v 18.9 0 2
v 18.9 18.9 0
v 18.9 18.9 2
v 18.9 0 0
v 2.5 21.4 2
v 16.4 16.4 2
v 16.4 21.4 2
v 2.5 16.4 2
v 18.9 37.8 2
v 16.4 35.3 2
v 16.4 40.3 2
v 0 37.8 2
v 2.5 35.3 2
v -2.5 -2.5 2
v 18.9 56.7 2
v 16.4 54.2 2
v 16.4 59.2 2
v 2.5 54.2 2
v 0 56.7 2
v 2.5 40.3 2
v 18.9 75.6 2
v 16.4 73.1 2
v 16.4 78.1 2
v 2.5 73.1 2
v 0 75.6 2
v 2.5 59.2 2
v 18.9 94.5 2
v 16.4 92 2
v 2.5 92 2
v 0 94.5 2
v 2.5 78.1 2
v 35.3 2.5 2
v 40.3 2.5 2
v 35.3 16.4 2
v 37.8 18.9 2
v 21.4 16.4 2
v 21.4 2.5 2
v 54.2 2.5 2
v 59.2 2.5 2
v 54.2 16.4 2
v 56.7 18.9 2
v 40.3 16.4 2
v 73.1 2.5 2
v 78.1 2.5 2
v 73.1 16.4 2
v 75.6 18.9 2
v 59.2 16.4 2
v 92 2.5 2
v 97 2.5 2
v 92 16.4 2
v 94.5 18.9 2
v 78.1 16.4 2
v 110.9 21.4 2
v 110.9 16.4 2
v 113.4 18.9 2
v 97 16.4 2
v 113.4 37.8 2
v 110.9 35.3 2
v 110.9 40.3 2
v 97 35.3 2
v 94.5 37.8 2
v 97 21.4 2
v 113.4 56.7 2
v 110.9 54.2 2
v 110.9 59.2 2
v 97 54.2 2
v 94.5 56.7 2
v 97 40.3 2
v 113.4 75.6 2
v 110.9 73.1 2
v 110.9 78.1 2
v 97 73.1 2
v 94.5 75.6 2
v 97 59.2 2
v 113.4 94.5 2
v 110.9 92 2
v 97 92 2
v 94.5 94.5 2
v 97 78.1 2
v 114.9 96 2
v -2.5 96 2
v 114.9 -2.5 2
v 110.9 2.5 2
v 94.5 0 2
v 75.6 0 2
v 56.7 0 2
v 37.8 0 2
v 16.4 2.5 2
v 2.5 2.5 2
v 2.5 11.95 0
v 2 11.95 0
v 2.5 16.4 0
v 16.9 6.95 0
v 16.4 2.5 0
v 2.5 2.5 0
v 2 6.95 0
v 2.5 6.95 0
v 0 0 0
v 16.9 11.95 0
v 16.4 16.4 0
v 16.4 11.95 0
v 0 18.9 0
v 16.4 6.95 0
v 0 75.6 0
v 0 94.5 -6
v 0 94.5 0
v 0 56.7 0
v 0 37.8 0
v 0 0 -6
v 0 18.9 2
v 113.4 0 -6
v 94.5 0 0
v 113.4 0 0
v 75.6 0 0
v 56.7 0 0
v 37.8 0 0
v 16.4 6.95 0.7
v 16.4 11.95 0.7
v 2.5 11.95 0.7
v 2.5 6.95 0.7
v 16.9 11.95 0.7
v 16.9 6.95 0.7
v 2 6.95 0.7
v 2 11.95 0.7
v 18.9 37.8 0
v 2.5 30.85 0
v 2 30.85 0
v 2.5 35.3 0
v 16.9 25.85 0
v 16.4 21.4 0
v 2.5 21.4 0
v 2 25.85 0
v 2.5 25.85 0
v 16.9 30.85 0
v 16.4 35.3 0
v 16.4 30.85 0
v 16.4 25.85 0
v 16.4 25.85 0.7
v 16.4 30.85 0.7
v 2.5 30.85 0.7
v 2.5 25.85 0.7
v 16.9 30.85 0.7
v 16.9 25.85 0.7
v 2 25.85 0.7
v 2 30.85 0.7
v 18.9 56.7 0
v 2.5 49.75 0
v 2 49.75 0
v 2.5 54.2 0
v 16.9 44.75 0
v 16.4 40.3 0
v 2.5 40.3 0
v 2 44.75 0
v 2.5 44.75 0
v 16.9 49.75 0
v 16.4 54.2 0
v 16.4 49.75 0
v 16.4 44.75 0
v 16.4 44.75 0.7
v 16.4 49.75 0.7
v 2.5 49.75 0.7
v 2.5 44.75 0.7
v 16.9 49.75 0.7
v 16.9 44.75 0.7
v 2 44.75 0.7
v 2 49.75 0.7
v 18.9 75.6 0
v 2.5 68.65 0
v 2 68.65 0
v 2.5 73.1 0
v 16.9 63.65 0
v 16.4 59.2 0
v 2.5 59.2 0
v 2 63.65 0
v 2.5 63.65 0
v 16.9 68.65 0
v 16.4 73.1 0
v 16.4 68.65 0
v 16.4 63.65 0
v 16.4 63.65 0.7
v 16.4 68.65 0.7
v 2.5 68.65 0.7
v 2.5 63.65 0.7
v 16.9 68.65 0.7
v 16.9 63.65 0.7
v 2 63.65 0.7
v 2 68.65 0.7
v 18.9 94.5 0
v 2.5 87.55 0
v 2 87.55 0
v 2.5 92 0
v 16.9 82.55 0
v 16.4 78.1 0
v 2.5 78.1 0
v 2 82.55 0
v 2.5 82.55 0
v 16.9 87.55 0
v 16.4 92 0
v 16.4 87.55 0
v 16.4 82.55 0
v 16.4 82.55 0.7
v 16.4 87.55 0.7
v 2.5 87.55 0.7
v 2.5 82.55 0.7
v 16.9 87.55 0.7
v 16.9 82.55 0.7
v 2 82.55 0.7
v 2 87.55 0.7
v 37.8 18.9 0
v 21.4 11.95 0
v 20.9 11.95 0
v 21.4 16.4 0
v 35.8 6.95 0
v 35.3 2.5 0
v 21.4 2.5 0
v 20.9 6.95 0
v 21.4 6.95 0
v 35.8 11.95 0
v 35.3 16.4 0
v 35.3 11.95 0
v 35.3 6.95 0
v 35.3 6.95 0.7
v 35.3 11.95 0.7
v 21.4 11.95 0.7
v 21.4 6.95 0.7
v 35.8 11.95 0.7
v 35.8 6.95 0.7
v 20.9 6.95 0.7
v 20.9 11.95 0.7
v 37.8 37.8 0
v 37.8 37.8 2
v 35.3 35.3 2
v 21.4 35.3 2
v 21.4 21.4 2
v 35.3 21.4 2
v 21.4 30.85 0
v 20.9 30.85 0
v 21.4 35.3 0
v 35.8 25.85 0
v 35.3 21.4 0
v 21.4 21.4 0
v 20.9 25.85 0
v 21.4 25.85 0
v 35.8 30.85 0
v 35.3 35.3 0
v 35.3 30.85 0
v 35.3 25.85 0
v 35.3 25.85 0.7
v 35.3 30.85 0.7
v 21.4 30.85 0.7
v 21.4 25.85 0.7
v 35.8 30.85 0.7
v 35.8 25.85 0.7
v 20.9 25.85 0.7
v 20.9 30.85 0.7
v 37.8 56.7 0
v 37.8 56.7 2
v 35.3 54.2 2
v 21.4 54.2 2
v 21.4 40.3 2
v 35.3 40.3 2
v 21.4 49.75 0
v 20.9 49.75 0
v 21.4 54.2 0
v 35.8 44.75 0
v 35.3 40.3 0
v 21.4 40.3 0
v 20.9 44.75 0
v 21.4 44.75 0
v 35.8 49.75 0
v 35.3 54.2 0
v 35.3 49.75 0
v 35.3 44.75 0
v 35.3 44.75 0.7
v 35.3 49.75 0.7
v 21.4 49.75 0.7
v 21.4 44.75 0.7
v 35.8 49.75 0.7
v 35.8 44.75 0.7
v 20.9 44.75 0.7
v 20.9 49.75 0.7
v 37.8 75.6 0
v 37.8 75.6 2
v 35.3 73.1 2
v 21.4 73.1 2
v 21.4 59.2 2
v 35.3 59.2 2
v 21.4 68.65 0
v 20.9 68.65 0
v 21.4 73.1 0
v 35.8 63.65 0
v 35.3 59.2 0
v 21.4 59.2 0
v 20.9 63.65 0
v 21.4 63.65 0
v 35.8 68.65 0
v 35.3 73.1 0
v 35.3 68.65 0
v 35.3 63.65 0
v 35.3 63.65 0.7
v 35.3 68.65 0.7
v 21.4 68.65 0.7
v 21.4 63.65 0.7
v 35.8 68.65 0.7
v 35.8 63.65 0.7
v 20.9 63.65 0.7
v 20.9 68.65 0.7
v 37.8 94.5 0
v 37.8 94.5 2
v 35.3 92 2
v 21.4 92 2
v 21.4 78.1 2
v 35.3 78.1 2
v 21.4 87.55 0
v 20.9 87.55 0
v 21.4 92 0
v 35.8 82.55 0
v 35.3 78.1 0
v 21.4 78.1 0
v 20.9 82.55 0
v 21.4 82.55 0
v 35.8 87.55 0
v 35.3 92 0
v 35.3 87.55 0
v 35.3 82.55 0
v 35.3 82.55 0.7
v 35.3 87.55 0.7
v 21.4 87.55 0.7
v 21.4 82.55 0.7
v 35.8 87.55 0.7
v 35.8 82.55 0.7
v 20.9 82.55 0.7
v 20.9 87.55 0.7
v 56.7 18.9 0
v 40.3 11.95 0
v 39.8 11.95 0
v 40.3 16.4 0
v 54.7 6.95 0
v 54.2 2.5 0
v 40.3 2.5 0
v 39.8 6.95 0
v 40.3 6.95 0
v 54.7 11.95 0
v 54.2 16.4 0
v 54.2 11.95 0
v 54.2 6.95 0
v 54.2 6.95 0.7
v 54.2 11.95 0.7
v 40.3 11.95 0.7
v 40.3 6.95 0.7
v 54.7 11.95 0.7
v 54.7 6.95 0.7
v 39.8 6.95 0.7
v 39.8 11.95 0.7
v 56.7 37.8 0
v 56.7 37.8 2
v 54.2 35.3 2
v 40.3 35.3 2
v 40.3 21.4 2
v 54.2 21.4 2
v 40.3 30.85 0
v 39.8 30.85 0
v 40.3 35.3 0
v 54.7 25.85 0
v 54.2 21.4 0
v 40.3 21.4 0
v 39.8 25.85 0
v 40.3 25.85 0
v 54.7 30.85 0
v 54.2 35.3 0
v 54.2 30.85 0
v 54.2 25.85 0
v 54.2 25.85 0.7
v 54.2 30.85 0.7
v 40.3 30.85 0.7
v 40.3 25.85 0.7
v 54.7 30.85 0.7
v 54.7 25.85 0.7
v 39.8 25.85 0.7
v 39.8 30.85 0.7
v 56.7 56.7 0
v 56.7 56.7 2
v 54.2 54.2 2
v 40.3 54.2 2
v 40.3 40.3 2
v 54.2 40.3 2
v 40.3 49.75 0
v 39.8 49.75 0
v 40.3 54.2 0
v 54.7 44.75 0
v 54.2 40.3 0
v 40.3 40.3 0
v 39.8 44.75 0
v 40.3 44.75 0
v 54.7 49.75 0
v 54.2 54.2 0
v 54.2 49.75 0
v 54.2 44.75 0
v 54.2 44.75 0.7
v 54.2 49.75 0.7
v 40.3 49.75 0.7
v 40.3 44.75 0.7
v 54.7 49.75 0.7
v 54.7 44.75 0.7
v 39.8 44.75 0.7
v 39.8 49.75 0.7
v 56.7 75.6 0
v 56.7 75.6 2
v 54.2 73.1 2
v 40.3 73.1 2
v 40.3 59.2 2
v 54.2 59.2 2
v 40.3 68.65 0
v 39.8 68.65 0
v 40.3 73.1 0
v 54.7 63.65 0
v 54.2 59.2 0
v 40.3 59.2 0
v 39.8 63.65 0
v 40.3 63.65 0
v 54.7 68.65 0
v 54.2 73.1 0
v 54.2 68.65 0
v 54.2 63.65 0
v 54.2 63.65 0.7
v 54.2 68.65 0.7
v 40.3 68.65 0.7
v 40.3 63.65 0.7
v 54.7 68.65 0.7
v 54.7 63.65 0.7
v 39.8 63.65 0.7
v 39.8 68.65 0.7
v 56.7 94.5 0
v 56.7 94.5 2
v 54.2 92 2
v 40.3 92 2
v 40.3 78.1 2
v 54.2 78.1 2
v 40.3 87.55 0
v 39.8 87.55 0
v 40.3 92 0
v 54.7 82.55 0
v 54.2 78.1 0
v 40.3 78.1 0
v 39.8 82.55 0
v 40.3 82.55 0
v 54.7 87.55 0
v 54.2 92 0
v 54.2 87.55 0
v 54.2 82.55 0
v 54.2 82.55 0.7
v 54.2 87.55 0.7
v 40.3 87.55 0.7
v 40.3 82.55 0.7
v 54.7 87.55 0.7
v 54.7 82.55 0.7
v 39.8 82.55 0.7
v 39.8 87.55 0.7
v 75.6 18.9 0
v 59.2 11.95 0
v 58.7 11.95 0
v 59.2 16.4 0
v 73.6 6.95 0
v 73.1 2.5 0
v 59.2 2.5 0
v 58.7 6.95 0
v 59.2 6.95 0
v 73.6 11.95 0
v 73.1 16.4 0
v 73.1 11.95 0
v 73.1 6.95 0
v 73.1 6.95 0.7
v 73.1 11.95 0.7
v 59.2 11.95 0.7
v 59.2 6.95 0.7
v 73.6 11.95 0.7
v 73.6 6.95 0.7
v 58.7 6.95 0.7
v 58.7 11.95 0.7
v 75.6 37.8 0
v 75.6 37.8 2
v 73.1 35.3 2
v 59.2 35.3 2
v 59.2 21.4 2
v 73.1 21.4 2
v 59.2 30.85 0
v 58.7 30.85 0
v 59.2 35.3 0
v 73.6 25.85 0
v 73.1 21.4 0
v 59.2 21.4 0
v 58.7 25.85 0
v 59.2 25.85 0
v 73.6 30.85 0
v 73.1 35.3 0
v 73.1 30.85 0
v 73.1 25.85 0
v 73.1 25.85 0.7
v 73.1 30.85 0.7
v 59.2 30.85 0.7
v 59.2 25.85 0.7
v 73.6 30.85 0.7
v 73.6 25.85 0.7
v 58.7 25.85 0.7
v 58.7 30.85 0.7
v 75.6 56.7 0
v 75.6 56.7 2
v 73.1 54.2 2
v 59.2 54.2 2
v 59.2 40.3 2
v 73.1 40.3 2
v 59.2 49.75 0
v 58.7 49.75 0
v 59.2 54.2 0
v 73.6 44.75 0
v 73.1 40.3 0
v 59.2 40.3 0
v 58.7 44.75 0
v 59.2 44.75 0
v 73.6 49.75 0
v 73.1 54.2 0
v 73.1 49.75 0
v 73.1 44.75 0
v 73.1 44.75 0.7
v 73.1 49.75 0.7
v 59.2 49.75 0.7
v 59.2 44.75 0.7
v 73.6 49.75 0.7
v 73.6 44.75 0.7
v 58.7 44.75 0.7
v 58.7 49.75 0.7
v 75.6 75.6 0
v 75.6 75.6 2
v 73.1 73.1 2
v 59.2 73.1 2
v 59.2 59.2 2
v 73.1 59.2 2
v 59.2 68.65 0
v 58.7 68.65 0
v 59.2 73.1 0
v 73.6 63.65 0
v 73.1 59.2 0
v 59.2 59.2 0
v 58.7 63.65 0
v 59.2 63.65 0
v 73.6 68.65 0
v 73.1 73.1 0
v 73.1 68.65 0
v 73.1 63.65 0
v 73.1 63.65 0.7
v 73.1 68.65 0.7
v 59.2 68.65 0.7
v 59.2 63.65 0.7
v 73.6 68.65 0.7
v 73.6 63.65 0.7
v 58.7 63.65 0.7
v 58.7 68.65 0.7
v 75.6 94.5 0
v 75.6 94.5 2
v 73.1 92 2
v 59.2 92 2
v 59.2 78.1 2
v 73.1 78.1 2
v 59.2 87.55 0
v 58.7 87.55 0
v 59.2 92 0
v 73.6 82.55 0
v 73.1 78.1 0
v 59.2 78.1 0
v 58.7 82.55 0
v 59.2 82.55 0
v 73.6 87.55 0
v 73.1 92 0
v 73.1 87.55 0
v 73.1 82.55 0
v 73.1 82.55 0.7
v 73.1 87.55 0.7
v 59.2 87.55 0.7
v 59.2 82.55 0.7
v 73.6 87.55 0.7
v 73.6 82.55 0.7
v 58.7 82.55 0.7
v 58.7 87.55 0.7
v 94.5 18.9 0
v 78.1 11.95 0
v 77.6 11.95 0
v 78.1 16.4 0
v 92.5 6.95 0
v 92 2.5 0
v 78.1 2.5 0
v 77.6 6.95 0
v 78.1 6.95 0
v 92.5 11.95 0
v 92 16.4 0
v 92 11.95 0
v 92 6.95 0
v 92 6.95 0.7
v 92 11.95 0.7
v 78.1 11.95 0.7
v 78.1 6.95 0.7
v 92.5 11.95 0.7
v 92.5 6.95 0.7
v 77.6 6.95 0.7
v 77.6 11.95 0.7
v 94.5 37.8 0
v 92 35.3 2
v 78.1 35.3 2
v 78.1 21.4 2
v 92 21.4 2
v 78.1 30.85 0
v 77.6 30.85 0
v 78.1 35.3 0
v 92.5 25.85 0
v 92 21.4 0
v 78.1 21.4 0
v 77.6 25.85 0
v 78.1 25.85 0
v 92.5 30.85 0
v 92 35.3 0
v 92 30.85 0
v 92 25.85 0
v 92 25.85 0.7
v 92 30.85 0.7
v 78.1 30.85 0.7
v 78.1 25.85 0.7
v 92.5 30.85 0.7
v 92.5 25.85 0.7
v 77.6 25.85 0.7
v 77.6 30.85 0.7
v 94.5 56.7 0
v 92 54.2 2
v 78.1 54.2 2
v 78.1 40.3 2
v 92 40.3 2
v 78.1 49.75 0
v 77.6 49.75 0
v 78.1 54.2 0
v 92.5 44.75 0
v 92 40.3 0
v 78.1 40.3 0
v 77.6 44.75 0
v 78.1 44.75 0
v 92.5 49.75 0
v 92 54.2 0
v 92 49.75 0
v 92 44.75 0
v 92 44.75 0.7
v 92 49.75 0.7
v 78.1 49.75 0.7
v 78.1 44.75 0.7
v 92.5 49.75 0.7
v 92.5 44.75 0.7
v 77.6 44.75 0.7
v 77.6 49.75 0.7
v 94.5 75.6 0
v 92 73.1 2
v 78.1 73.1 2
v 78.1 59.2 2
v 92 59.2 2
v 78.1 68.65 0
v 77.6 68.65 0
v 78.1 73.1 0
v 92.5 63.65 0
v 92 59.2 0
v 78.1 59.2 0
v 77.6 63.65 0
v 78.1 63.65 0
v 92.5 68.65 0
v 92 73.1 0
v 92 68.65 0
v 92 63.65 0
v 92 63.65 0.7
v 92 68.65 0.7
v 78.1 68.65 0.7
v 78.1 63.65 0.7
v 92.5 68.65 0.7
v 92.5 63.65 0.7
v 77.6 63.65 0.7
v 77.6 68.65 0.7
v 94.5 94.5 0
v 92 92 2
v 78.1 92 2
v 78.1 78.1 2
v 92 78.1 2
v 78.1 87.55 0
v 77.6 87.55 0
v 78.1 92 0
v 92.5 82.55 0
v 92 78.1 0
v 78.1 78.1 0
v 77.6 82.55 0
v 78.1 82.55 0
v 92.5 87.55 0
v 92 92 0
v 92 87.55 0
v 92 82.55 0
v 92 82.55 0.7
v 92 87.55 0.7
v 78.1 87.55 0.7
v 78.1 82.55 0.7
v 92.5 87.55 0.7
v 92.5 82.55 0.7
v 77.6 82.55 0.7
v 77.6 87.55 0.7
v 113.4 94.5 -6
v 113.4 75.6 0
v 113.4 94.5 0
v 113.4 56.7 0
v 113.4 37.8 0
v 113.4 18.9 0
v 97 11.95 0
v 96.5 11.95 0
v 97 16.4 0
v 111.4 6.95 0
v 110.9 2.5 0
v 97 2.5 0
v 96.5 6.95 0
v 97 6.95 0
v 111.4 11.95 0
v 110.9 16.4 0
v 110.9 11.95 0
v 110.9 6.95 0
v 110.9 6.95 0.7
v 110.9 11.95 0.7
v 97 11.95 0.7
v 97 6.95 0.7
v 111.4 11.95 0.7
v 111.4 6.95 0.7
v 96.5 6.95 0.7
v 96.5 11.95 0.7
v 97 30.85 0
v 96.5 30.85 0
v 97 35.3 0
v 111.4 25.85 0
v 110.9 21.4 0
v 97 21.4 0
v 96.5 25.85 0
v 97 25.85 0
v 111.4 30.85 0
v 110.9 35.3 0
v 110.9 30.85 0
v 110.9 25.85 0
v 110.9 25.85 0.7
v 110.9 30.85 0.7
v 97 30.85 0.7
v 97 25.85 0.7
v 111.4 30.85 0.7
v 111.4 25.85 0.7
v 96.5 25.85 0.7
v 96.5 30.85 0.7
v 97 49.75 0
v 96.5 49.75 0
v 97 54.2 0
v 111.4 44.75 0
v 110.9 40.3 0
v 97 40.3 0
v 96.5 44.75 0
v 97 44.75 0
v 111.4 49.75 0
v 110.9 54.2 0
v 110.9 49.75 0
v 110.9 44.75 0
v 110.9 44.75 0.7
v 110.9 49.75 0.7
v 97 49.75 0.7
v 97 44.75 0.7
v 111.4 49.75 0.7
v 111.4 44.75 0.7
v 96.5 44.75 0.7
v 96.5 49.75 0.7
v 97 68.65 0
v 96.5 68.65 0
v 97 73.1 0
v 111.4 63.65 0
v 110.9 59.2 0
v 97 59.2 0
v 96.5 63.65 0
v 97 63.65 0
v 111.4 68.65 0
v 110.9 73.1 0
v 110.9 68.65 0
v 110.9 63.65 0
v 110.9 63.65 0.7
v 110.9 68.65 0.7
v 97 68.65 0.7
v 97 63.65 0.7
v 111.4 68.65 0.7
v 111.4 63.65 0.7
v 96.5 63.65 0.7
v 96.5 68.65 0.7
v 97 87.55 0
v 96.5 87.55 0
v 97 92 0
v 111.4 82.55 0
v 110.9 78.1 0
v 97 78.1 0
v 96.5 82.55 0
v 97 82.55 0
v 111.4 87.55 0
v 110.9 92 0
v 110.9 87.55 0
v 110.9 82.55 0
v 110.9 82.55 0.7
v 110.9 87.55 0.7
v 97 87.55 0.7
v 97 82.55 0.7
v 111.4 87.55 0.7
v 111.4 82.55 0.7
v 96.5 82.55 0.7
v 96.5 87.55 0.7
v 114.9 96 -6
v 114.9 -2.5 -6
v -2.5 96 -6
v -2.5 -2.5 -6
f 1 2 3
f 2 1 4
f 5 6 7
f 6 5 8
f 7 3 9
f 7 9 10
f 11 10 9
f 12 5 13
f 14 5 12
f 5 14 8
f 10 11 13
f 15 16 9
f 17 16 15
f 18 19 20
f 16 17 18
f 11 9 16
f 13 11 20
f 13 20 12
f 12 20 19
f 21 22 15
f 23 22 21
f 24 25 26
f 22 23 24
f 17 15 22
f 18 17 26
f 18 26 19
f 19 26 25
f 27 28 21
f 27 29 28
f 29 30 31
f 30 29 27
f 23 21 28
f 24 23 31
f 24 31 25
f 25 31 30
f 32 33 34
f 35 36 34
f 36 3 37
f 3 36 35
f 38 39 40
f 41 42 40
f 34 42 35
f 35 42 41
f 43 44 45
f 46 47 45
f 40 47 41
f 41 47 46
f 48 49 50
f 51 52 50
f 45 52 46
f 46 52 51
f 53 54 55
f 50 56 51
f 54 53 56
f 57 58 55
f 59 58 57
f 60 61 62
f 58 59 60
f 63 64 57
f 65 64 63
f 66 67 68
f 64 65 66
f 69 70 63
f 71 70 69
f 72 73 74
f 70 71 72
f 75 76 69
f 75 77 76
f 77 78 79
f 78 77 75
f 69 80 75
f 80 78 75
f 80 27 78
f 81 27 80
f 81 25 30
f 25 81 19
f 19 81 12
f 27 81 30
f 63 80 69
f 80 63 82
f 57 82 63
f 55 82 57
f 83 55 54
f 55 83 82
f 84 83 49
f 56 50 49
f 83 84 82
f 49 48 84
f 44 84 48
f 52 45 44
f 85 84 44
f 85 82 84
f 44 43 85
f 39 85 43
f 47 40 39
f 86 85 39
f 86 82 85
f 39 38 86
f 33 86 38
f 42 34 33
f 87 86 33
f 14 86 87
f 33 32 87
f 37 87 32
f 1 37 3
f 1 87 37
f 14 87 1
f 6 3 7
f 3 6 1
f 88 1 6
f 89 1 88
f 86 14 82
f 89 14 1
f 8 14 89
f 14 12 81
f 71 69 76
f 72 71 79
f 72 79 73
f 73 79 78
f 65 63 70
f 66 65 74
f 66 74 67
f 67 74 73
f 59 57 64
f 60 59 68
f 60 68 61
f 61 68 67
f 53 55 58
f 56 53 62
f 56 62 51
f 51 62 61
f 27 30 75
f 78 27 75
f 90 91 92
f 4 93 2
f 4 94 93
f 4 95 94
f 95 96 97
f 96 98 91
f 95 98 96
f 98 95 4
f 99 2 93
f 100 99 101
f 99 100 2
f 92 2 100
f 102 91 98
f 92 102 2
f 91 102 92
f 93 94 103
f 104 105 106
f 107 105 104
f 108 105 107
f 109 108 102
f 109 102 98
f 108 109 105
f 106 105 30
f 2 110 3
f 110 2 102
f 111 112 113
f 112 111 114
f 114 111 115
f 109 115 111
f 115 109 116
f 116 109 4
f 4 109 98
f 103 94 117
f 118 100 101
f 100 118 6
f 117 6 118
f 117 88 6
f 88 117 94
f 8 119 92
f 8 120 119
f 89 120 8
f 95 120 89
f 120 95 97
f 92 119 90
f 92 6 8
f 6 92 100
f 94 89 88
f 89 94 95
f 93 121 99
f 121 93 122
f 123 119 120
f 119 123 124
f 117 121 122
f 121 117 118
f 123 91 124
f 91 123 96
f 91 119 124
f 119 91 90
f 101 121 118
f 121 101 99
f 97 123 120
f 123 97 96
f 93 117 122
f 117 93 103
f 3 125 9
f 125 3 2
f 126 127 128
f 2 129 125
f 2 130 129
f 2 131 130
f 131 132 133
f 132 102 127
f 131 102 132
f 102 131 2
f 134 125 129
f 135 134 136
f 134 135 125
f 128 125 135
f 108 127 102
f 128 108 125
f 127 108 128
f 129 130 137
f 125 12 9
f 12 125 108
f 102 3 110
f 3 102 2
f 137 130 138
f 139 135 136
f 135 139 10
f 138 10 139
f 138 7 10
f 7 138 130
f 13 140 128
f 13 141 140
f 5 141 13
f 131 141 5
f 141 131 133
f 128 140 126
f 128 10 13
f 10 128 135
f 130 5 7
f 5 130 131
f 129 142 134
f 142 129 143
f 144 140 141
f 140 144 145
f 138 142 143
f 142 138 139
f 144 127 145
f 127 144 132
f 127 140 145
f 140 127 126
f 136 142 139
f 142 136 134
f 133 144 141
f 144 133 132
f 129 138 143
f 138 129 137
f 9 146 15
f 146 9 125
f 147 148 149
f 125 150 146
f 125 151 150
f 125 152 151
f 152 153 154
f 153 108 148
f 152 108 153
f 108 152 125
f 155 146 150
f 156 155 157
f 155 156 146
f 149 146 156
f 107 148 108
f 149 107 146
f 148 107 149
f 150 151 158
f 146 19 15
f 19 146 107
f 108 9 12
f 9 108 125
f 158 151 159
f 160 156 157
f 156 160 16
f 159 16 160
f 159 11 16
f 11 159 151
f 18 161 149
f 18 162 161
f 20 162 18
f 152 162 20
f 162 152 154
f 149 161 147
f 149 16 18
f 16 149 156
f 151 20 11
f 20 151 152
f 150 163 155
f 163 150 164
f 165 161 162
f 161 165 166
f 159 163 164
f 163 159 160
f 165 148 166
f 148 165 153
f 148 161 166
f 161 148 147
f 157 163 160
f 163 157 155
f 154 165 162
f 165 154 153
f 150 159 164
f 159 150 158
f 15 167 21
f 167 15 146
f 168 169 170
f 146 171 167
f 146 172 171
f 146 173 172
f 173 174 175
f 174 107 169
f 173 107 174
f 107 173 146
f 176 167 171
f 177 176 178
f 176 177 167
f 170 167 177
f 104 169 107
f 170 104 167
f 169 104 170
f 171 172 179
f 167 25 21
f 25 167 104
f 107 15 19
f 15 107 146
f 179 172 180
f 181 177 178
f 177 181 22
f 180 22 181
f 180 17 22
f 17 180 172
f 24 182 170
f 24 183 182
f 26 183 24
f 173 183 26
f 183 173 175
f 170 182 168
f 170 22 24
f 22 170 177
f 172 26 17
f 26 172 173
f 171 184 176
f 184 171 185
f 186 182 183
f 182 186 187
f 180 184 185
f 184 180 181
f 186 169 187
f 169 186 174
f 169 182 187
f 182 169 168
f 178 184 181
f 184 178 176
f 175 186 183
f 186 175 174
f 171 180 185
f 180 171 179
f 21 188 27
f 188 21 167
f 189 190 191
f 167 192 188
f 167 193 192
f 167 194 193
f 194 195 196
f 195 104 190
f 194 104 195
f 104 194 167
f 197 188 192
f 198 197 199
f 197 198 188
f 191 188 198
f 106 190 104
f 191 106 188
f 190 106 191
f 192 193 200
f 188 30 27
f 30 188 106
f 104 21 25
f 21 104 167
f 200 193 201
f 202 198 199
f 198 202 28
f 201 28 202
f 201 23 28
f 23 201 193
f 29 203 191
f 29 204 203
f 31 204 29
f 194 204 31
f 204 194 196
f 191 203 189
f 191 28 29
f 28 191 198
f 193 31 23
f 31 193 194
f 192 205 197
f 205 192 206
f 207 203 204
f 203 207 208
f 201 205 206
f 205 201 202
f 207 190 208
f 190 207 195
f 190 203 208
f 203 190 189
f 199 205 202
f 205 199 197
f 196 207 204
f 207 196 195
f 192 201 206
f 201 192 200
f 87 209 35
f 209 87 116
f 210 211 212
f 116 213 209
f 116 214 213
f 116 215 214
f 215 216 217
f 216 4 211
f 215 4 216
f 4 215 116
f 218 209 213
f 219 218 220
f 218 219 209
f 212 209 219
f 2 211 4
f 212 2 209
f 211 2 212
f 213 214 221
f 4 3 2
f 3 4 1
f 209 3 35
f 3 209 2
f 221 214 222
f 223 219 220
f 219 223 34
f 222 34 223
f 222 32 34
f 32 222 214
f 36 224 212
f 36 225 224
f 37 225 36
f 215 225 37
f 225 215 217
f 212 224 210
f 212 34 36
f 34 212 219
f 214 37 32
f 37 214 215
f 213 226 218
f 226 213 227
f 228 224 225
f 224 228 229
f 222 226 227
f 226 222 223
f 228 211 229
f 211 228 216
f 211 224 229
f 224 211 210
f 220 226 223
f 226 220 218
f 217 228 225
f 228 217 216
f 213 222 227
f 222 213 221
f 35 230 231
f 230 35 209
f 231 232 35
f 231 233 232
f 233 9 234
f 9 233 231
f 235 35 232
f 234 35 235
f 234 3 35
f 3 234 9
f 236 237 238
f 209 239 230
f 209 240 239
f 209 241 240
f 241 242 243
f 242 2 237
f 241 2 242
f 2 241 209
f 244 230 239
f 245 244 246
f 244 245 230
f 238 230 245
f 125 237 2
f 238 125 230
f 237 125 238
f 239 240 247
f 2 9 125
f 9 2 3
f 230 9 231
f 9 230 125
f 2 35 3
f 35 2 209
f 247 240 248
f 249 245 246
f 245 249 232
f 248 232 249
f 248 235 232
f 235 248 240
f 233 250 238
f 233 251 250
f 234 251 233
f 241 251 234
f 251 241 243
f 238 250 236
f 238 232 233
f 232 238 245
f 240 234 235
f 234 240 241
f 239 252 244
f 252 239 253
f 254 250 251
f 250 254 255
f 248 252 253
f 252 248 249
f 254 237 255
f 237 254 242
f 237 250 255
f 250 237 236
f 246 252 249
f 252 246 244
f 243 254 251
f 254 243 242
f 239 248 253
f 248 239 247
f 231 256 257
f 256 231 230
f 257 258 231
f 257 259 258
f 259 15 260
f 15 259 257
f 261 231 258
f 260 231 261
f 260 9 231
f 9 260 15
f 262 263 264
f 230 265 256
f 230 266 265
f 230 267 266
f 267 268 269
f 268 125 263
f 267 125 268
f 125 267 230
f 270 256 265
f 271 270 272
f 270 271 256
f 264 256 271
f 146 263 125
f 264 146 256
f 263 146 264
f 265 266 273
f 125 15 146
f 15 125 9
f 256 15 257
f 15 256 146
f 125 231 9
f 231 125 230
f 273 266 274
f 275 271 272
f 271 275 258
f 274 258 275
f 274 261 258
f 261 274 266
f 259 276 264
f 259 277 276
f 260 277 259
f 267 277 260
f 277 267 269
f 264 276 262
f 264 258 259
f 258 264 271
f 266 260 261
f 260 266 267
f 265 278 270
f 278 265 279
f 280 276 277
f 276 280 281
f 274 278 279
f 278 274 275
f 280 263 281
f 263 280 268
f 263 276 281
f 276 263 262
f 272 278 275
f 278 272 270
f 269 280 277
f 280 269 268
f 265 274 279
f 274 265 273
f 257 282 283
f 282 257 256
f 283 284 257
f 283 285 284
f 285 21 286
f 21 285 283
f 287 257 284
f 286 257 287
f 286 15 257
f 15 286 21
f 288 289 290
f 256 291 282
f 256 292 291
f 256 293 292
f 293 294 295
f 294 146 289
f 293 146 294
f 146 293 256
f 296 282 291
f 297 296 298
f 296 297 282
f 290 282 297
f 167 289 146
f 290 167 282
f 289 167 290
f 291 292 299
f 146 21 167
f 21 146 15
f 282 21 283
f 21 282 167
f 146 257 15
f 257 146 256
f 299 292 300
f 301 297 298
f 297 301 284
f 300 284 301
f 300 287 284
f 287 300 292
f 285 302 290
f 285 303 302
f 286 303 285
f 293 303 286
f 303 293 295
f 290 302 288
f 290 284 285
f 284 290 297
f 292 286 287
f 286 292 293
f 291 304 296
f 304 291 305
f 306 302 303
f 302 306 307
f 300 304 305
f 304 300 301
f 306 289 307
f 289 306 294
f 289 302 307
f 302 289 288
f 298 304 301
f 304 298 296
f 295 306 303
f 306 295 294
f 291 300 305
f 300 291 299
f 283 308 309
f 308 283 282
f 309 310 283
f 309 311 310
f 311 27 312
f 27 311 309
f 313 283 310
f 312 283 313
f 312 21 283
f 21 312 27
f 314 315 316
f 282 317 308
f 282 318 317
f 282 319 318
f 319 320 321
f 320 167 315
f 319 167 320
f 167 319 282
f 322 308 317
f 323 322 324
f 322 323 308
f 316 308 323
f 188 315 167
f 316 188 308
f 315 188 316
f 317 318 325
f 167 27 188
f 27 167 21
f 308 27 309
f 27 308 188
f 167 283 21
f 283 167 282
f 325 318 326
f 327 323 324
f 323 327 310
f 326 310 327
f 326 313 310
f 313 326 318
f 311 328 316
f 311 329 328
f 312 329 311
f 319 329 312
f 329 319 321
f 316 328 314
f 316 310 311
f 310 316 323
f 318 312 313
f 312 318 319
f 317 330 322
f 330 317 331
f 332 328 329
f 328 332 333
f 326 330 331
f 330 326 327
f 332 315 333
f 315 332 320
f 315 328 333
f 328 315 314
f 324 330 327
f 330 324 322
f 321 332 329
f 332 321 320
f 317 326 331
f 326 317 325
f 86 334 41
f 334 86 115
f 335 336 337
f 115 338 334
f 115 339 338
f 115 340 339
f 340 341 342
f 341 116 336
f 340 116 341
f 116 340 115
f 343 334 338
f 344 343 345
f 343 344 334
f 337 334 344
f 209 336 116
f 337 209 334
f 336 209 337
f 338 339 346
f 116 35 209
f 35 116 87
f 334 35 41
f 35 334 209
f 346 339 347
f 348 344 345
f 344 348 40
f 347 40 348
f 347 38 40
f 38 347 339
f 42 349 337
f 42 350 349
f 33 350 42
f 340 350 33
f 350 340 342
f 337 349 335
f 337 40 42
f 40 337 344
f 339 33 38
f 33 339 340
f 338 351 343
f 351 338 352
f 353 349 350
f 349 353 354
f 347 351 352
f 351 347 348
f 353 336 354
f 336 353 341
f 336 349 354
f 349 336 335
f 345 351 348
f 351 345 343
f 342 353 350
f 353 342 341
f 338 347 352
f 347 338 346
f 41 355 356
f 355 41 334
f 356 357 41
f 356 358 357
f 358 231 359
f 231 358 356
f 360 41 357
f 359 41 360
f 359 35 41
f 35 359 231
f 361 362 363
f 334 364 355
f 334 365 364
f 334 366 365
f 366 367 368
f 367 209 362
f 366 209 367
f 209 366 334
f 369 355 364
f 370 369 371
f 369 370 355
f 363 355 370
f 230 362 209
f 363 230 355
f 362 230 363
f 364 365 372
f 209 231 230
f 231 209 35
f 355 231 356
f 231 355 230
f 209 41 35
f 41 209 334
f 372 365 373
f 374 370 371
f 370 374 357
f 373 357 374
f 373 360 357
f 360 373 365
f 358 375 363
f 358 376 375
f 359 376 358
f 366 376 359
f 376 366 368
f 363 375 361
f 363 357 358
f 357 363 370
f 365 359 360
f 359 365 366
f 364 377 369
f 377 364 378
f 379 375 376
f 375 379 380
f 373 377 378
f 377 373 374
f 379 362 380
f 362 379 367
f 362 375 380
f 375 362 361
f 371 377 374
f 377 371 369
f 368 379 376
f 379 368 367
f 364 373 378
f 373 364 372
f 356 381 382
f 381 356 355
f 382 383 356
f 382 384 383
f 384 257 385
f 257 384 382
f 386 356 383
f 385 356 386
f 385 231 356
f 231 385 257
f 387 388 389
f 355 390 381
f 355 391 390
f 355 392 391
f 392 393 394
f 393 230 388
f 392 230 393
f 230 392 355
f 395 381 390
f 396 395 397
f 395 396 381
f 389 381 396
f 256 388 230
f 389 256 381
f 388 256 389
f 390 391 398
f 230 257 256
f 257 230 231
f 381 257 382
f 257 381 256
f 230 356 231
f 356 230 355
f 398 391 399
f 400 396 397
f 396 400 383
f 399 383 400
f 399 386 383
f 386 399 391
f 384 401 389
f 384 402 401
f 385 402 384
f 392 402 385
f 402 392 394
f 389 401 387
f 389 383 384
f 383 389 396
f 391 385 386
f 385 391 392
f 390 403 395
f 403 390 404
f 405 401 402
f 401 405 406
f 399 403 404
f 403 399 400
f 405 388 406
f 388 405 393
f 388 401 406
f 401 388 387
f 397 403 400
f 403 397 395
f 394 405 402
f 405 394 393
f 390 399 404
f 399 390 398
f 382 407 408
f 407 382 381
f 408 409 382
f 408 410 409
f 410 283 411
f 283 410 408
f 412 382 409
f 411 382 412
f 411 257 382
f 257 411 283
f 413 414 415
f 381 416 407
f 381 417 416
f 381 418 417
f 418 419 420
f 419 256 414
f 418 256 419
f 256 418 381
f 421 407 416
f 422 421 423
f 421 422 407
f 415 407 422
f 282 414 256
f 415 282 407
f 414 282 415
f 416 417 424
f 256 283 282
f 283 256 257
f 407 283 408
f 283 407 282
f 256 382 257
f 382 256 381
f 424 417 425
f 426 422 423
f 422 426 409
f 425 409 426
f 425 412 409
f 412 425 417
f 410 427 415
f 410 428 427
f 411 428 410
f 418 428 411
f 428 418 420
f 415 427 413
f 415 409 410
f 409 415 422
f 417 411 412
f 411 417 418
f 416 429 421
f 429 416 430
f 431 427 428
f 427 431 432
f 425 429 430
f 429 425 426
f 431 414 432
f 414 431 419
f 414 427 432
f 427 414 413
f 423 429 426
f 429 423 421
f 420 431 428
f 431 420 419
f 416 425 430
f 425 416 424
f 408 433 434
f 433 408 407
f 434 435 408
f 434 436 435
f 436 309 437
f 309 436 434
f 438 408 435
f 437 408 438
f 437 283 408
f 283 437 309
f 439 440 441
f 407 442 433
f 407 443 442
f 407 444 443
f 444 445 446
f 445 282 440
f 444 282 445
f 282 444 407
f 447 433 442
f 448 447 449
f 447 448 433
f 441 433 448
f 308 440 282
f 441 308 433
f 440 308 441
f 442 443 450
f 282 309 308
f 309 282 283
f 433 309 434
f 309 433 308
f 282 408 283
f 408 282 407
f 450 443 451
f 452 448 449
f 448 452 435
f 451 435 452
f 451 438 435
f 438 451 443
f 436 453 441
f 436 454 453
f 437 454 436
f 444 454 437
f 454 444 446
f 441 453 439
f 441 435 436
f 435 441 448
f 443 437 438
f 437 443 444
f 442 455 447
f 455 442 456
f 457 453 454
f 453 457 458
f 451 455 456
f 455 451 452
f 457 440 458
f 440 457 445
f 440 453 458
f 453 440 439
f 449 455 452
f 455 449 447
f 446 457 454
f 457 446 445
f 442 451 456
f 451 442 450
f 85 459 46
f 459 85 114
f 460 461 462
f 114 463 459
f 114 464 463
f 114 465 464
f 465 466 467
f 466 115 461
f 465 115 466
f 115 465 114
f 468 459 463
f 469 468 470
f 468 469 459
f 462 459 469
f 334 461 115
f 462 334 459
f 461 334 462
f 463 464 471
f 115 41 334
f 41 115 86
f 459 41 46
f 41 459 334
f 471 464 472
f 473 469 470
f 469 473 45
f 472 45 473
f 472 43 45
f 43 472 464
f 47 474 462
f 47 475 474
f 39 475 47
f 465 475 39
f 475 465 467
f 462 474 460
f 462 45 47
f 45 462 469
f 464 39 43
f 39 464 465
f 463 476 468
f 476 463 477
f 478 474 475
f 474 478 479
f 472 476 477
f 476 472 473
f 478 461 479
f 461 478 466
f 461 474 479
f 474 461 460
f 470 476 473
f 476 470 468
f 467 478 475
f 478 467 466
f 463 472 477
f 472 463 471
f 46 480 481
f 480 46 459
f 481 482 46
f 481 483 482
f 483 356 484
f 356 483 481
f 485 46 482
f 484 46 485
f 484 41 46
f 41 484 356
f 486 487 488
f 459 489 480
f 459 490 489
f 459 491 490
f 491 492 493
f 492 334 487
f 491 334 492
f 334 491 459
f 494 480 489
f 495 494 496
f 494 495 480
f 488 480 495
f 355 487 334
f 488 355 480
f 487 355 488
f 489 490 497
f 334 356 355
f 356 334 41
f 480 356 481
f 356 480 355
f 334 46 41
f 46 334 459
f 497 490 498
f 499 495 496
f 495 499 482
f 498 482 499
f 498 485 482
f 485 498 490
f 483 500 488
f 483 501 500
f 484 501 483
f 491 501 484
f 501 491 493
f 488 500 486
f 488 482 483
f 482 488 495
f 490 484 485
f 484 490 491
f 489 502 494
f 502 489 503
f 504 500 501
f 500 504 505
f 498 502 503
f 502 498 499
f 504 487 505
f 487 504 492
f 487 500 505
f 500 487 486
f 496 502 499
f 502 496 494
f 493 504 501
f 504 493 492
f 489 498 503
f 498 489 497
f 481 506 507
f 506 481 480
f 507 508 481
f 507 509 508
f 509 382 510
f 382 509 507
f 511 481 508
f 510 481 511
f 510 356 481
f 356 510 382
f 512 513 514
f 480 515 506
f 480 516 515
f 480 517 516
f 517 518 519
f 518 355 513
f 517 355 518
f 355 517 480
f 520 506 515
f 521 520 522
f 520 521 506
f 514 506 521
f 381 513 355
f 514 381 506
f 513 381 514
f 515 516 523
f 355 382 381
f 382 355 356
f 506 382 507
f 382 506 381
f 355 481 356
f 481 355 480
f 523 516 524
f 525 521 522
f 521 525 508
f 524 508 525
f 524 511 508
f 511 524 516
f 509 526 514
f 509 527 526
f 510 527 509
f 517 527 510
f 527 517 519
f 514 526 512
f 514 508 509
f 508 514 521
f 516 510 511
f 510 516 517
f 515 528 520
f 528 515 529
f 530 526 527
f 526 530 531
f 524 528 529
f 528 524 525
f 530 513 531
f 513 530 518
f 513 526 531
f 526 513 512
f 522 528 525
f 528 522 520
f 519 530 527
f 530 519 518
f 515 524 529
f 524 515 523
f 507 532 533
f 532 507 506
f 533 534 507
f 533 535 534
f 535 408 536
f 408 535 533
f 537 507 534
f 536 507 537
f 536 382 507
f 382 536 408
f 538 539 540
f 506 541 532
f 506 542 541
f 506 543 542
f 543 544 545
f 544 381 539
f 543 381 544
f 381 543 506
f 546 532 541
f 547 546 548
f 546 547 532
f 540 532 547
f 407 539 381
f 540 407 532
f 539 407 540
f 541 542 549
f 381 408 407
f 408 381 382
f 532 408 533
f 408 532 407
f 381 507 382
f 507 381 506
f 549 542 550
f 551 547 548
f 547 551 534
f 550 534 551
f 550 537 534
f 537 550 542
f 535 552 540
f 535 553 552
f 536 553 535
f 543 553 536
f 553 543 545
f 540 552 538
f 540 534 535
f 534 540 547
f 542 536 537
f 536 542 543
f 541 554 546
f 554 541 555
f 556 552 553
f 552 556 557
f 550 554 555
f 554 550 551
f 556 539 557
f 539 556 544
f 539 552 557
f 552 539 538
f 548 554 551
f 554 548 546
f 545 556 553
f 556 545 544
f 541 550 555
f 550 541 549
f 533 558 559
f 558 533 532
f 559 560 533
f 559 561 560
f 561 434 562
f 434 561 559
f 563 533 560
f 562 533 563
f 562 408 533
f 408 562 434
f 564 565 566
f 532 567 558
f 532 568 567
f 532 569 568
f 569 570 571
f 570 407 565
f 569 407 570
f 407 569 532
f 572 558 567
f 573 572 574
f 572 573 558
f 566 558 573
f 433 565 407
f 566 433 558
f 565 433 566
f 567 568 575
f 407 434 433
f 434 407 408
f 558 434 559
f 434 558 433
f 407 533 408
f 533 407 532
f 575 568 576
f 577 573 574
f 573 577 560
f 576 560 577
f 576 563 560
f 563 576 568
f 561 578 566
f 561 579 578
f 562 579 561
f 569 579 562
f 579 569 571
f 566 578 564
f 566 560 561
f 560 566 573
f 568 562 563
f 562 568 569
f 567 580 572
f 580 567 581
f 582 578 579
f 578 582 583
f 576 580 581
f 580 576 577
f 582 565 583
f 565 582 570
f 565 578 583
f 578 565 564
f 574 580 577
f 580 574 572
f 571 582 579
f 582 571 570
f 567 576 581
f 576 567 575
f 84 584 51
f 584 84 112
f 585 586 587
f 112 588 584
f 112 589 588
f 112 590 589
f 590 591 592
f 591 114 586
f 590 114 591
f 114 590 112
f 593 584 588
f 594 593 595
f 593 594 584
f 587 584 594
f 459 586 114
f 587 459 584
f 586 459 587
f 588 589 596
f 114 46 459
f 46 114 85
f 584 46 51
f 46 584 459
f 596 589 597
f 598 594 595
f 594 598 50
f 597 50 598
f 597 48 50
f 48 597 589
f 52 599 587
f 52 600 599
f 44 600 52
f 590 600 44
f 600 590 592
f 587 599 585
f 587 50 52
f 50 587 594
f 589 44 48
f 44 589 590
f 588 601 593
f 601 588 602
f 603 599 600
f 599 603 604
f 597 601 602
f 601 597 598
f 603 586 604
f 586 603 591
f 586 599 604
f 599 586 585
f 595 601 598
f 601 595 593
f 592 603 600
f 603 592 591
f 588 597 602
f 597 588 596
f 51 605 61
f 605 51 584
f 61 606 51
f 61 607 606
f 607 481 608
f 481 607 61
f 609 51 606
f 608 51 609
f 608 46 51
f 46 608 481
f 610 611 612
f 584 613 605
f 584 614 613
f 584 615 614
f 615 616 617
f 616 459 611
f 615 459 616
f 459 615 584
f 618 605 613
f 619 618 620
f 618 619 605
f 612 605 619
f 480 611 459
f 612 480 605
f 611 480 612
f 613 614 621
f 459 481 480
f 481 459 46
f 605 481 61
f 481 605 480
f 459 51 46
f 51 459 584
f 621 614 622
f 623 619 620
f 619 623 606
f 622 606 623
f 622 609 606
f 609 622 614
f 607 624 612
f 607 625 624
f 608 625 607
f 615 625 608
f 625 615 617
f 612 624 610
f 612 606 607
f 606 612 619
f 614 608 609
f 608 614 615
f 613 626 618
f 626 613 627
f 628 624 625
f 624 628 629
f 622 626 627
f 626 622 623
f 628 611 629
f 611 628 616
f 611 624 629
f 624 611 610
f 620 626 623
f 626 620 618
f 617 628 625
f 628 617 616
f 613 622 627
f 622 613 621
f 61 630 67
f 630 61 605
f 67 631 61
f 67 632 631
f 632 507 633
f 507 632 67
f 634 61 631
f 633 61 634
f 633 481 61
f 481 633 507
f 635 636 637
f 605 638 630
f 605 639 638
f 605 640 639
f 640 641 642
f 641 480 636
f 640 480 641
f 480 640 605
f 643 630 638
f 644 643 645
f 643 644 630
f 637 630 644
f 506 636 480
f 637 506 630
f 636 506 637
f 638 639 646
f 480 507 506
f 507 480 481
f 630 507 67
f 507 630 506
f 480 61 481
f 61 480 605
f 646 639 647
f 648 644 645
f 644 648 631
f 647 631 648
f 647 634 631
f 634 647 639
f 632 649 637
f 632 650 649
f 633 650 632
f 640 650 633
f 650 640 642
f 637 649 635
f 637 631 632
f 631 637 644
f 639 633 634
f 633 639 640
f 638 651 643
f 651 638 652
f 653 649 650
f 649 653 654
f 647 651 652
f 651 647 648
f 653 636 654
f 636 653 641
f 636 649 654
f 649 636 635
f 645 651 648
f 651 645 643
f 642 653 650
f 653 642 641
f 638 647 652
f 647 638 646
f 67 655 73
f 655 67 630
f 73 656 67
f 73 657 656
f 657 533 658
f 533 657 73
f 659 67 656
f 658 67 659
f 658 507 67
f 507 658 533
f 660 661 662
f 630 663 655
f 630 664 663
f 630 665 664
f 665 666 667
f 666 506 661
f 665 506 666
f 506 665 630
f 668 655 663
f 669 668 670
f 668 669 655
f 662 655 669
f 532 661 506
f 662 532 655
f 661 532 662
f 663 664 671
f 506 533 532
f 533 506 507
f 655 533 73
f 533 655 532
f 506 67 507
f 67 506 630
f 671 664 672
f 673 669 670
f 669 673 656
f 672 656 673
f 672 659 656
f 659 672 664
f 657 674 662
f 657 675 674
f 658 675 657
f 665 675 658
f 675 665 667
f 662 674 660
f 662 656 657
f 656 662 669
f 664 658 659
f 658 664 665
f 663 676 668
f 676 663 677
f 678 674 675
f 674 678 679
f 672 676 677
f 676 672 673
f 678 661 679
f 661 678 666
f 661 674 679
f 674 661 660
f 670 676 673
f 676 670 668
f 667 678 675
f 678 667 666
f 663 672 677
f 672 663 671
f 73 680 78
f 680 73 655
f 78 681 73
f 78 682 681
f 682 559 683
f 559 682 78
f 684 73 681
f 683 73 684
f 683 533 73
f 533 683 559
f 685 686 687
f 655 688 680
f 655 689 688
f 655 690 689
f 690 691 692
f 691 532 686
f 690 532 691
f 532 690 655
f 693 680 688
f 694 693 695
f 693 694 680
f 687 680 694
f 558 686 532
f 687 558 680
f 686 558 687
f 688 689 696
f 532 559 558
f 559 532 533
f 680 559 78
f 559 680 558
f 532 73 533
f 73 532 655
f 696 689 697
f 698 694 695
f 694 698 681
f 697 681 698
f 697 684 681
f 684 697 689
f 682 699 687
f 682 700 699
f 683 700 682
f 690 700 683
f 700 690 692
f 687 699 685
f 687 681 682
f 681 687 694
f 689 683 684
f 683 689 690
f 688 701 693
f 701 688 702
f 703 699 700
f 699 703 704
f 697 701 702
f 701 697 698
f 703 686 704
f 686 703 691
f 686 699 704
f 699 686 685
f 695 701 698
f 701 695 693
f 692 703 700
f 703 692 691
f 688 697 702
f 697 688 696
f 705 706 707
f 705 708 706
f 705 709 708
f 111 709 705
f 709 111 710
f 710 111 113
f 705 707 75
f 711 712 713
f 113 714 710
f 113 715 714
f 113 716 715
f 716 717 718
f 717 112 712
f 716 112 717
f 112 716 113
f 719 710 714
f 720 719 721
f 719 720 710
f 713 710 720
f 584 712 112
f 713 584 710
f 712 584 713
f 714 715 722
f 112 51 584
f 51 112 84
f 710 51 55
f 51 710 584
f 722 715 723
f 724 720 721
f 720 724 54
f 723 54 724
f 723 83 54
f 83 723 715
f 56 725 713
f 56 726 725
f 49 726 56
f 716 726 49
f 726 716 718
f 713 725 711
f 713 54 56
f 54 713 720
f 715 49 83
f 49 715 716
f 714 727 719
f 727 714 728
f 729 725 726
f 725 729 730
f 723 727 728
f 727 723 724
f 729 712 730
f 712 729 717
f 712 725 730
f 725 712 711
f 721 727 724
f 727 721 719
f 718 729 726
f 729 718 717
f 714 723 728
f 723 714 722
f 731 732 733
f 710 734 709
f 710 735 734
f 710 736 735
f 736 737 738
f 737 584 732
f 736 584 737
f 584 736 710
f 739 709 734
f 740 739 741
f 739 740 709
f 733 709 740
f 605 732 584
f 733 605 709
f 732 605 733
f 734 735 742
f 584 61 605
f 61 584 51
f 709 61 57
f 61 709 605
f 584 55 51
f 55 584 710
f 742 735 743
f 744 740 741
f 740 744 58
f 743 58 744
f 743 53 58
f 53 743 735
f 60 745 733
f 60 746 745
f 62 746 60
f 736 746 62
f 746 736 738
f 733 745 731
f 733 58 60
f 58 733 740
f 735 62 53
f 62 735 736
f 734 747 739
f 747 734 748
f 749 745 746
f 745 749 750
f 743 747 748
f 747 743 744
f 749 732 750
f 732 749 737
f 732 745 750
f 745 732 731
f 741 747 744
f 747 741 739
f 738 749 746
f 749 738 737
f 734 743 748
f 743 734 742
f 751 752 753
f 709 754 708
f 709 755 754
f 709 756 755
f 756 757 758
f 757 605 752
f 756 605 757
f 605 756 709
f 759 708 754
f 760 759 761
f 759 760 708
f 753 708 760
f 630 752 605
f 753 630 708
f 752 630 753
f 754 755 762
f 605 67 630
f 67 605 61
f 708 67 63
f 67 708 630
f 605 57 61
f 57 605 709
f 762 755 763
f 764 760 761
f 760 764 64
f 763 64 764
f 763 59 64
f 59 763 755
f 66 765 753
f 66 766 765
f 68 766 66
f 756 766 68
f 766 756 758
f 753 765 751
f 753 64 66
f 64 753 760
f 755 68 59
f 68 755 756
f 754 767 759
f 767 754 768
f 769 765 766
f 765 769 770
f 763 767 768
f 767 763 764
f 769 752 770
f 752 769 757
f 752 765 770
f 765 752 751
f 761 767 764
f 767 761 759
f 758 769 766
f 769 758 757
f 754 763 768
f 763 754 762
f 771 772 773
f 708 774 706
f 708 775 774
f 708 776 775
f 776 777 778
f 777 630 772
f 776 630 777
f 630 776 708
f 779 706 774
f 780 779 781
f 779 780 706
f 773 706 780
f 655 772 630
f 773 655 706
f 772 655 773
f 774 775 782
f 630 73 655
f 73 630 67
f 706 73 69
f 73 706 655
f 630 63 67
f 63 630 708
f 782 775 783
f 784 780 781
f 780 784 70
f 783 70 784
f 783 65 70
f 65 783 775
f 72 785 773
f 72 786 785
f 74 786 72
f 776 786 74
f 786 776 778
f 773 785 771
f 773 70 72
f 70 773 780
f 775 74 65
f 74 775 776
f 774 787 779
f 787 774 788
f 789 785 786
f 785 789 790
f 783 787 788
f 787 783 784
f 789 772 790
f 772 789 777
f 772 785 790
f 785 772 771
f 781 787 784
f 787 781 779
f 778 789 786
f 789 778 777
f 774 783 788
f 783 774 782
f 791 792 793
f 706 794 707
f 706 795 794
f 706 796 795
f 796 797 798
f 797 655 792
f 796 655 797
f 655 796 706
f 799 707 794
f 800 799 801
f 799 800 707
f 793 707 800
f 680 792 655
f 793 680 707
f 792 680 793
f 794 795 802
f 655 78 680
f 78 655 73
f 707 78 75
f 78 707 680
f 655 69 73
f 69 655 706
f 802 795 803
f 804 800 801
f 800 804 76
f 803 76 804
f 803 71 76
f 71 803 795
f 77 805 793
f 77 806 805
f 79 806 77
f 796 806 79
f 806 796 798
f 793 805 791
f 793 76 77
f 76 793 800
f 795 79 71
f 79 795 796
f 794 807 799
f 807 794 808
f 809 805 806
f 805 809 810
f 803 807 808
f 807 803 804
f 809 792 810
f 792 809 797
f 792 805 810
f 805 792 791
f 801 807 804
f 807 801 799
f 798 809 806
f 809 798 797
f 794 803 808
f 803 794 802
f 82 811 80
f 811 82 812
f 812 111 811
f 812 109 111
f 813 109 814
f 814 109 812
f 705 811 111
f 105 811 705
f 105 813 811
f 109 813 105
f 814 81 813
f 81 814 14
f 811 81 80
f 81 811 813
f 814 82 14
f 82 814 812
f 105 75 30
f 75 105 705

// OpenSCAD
module socket(l=13.9, wall=2, height=4)
{
        difference()
        {
                difference(){
                        cube([l+wall*2, l+wall*2, height]);
                        translate([wall, wall, -1])
                                cube([l, l, height+2]);
                }
                translate([wall-0.5, (l+wall*2-5)/2, -(1.3)])
                        cube([l+1, 5, height]);
        }
}


module keypad_matrix(count_x=6, count_y=6, socket=[13.9, 2.5, 2], wall=2, height=8)
{
        transp=(socket[0]+2*socket[1]);
        for(x=[0:count_x-1])
        {

                for(y=[0:count_y-1])
                {
                        translate([x*transp, y*transp, 0])
                                socket(socket[0],socket[1],socket[2]);
                }
        }
        translate([0,0,-(height-socket[2])])
        difference()
        {
        translate([-socket[1],-socket[1],0])
        cube([(count_x)*transp+wall*2, (count_y)*transp+wall*2, height]);
        translate([0,0,-0.1])
        cube([(count_x)*transp, (count_y)*transp, height+0.2]);
        }


}

keypad_matrix(count_x=6, count_y=5);
